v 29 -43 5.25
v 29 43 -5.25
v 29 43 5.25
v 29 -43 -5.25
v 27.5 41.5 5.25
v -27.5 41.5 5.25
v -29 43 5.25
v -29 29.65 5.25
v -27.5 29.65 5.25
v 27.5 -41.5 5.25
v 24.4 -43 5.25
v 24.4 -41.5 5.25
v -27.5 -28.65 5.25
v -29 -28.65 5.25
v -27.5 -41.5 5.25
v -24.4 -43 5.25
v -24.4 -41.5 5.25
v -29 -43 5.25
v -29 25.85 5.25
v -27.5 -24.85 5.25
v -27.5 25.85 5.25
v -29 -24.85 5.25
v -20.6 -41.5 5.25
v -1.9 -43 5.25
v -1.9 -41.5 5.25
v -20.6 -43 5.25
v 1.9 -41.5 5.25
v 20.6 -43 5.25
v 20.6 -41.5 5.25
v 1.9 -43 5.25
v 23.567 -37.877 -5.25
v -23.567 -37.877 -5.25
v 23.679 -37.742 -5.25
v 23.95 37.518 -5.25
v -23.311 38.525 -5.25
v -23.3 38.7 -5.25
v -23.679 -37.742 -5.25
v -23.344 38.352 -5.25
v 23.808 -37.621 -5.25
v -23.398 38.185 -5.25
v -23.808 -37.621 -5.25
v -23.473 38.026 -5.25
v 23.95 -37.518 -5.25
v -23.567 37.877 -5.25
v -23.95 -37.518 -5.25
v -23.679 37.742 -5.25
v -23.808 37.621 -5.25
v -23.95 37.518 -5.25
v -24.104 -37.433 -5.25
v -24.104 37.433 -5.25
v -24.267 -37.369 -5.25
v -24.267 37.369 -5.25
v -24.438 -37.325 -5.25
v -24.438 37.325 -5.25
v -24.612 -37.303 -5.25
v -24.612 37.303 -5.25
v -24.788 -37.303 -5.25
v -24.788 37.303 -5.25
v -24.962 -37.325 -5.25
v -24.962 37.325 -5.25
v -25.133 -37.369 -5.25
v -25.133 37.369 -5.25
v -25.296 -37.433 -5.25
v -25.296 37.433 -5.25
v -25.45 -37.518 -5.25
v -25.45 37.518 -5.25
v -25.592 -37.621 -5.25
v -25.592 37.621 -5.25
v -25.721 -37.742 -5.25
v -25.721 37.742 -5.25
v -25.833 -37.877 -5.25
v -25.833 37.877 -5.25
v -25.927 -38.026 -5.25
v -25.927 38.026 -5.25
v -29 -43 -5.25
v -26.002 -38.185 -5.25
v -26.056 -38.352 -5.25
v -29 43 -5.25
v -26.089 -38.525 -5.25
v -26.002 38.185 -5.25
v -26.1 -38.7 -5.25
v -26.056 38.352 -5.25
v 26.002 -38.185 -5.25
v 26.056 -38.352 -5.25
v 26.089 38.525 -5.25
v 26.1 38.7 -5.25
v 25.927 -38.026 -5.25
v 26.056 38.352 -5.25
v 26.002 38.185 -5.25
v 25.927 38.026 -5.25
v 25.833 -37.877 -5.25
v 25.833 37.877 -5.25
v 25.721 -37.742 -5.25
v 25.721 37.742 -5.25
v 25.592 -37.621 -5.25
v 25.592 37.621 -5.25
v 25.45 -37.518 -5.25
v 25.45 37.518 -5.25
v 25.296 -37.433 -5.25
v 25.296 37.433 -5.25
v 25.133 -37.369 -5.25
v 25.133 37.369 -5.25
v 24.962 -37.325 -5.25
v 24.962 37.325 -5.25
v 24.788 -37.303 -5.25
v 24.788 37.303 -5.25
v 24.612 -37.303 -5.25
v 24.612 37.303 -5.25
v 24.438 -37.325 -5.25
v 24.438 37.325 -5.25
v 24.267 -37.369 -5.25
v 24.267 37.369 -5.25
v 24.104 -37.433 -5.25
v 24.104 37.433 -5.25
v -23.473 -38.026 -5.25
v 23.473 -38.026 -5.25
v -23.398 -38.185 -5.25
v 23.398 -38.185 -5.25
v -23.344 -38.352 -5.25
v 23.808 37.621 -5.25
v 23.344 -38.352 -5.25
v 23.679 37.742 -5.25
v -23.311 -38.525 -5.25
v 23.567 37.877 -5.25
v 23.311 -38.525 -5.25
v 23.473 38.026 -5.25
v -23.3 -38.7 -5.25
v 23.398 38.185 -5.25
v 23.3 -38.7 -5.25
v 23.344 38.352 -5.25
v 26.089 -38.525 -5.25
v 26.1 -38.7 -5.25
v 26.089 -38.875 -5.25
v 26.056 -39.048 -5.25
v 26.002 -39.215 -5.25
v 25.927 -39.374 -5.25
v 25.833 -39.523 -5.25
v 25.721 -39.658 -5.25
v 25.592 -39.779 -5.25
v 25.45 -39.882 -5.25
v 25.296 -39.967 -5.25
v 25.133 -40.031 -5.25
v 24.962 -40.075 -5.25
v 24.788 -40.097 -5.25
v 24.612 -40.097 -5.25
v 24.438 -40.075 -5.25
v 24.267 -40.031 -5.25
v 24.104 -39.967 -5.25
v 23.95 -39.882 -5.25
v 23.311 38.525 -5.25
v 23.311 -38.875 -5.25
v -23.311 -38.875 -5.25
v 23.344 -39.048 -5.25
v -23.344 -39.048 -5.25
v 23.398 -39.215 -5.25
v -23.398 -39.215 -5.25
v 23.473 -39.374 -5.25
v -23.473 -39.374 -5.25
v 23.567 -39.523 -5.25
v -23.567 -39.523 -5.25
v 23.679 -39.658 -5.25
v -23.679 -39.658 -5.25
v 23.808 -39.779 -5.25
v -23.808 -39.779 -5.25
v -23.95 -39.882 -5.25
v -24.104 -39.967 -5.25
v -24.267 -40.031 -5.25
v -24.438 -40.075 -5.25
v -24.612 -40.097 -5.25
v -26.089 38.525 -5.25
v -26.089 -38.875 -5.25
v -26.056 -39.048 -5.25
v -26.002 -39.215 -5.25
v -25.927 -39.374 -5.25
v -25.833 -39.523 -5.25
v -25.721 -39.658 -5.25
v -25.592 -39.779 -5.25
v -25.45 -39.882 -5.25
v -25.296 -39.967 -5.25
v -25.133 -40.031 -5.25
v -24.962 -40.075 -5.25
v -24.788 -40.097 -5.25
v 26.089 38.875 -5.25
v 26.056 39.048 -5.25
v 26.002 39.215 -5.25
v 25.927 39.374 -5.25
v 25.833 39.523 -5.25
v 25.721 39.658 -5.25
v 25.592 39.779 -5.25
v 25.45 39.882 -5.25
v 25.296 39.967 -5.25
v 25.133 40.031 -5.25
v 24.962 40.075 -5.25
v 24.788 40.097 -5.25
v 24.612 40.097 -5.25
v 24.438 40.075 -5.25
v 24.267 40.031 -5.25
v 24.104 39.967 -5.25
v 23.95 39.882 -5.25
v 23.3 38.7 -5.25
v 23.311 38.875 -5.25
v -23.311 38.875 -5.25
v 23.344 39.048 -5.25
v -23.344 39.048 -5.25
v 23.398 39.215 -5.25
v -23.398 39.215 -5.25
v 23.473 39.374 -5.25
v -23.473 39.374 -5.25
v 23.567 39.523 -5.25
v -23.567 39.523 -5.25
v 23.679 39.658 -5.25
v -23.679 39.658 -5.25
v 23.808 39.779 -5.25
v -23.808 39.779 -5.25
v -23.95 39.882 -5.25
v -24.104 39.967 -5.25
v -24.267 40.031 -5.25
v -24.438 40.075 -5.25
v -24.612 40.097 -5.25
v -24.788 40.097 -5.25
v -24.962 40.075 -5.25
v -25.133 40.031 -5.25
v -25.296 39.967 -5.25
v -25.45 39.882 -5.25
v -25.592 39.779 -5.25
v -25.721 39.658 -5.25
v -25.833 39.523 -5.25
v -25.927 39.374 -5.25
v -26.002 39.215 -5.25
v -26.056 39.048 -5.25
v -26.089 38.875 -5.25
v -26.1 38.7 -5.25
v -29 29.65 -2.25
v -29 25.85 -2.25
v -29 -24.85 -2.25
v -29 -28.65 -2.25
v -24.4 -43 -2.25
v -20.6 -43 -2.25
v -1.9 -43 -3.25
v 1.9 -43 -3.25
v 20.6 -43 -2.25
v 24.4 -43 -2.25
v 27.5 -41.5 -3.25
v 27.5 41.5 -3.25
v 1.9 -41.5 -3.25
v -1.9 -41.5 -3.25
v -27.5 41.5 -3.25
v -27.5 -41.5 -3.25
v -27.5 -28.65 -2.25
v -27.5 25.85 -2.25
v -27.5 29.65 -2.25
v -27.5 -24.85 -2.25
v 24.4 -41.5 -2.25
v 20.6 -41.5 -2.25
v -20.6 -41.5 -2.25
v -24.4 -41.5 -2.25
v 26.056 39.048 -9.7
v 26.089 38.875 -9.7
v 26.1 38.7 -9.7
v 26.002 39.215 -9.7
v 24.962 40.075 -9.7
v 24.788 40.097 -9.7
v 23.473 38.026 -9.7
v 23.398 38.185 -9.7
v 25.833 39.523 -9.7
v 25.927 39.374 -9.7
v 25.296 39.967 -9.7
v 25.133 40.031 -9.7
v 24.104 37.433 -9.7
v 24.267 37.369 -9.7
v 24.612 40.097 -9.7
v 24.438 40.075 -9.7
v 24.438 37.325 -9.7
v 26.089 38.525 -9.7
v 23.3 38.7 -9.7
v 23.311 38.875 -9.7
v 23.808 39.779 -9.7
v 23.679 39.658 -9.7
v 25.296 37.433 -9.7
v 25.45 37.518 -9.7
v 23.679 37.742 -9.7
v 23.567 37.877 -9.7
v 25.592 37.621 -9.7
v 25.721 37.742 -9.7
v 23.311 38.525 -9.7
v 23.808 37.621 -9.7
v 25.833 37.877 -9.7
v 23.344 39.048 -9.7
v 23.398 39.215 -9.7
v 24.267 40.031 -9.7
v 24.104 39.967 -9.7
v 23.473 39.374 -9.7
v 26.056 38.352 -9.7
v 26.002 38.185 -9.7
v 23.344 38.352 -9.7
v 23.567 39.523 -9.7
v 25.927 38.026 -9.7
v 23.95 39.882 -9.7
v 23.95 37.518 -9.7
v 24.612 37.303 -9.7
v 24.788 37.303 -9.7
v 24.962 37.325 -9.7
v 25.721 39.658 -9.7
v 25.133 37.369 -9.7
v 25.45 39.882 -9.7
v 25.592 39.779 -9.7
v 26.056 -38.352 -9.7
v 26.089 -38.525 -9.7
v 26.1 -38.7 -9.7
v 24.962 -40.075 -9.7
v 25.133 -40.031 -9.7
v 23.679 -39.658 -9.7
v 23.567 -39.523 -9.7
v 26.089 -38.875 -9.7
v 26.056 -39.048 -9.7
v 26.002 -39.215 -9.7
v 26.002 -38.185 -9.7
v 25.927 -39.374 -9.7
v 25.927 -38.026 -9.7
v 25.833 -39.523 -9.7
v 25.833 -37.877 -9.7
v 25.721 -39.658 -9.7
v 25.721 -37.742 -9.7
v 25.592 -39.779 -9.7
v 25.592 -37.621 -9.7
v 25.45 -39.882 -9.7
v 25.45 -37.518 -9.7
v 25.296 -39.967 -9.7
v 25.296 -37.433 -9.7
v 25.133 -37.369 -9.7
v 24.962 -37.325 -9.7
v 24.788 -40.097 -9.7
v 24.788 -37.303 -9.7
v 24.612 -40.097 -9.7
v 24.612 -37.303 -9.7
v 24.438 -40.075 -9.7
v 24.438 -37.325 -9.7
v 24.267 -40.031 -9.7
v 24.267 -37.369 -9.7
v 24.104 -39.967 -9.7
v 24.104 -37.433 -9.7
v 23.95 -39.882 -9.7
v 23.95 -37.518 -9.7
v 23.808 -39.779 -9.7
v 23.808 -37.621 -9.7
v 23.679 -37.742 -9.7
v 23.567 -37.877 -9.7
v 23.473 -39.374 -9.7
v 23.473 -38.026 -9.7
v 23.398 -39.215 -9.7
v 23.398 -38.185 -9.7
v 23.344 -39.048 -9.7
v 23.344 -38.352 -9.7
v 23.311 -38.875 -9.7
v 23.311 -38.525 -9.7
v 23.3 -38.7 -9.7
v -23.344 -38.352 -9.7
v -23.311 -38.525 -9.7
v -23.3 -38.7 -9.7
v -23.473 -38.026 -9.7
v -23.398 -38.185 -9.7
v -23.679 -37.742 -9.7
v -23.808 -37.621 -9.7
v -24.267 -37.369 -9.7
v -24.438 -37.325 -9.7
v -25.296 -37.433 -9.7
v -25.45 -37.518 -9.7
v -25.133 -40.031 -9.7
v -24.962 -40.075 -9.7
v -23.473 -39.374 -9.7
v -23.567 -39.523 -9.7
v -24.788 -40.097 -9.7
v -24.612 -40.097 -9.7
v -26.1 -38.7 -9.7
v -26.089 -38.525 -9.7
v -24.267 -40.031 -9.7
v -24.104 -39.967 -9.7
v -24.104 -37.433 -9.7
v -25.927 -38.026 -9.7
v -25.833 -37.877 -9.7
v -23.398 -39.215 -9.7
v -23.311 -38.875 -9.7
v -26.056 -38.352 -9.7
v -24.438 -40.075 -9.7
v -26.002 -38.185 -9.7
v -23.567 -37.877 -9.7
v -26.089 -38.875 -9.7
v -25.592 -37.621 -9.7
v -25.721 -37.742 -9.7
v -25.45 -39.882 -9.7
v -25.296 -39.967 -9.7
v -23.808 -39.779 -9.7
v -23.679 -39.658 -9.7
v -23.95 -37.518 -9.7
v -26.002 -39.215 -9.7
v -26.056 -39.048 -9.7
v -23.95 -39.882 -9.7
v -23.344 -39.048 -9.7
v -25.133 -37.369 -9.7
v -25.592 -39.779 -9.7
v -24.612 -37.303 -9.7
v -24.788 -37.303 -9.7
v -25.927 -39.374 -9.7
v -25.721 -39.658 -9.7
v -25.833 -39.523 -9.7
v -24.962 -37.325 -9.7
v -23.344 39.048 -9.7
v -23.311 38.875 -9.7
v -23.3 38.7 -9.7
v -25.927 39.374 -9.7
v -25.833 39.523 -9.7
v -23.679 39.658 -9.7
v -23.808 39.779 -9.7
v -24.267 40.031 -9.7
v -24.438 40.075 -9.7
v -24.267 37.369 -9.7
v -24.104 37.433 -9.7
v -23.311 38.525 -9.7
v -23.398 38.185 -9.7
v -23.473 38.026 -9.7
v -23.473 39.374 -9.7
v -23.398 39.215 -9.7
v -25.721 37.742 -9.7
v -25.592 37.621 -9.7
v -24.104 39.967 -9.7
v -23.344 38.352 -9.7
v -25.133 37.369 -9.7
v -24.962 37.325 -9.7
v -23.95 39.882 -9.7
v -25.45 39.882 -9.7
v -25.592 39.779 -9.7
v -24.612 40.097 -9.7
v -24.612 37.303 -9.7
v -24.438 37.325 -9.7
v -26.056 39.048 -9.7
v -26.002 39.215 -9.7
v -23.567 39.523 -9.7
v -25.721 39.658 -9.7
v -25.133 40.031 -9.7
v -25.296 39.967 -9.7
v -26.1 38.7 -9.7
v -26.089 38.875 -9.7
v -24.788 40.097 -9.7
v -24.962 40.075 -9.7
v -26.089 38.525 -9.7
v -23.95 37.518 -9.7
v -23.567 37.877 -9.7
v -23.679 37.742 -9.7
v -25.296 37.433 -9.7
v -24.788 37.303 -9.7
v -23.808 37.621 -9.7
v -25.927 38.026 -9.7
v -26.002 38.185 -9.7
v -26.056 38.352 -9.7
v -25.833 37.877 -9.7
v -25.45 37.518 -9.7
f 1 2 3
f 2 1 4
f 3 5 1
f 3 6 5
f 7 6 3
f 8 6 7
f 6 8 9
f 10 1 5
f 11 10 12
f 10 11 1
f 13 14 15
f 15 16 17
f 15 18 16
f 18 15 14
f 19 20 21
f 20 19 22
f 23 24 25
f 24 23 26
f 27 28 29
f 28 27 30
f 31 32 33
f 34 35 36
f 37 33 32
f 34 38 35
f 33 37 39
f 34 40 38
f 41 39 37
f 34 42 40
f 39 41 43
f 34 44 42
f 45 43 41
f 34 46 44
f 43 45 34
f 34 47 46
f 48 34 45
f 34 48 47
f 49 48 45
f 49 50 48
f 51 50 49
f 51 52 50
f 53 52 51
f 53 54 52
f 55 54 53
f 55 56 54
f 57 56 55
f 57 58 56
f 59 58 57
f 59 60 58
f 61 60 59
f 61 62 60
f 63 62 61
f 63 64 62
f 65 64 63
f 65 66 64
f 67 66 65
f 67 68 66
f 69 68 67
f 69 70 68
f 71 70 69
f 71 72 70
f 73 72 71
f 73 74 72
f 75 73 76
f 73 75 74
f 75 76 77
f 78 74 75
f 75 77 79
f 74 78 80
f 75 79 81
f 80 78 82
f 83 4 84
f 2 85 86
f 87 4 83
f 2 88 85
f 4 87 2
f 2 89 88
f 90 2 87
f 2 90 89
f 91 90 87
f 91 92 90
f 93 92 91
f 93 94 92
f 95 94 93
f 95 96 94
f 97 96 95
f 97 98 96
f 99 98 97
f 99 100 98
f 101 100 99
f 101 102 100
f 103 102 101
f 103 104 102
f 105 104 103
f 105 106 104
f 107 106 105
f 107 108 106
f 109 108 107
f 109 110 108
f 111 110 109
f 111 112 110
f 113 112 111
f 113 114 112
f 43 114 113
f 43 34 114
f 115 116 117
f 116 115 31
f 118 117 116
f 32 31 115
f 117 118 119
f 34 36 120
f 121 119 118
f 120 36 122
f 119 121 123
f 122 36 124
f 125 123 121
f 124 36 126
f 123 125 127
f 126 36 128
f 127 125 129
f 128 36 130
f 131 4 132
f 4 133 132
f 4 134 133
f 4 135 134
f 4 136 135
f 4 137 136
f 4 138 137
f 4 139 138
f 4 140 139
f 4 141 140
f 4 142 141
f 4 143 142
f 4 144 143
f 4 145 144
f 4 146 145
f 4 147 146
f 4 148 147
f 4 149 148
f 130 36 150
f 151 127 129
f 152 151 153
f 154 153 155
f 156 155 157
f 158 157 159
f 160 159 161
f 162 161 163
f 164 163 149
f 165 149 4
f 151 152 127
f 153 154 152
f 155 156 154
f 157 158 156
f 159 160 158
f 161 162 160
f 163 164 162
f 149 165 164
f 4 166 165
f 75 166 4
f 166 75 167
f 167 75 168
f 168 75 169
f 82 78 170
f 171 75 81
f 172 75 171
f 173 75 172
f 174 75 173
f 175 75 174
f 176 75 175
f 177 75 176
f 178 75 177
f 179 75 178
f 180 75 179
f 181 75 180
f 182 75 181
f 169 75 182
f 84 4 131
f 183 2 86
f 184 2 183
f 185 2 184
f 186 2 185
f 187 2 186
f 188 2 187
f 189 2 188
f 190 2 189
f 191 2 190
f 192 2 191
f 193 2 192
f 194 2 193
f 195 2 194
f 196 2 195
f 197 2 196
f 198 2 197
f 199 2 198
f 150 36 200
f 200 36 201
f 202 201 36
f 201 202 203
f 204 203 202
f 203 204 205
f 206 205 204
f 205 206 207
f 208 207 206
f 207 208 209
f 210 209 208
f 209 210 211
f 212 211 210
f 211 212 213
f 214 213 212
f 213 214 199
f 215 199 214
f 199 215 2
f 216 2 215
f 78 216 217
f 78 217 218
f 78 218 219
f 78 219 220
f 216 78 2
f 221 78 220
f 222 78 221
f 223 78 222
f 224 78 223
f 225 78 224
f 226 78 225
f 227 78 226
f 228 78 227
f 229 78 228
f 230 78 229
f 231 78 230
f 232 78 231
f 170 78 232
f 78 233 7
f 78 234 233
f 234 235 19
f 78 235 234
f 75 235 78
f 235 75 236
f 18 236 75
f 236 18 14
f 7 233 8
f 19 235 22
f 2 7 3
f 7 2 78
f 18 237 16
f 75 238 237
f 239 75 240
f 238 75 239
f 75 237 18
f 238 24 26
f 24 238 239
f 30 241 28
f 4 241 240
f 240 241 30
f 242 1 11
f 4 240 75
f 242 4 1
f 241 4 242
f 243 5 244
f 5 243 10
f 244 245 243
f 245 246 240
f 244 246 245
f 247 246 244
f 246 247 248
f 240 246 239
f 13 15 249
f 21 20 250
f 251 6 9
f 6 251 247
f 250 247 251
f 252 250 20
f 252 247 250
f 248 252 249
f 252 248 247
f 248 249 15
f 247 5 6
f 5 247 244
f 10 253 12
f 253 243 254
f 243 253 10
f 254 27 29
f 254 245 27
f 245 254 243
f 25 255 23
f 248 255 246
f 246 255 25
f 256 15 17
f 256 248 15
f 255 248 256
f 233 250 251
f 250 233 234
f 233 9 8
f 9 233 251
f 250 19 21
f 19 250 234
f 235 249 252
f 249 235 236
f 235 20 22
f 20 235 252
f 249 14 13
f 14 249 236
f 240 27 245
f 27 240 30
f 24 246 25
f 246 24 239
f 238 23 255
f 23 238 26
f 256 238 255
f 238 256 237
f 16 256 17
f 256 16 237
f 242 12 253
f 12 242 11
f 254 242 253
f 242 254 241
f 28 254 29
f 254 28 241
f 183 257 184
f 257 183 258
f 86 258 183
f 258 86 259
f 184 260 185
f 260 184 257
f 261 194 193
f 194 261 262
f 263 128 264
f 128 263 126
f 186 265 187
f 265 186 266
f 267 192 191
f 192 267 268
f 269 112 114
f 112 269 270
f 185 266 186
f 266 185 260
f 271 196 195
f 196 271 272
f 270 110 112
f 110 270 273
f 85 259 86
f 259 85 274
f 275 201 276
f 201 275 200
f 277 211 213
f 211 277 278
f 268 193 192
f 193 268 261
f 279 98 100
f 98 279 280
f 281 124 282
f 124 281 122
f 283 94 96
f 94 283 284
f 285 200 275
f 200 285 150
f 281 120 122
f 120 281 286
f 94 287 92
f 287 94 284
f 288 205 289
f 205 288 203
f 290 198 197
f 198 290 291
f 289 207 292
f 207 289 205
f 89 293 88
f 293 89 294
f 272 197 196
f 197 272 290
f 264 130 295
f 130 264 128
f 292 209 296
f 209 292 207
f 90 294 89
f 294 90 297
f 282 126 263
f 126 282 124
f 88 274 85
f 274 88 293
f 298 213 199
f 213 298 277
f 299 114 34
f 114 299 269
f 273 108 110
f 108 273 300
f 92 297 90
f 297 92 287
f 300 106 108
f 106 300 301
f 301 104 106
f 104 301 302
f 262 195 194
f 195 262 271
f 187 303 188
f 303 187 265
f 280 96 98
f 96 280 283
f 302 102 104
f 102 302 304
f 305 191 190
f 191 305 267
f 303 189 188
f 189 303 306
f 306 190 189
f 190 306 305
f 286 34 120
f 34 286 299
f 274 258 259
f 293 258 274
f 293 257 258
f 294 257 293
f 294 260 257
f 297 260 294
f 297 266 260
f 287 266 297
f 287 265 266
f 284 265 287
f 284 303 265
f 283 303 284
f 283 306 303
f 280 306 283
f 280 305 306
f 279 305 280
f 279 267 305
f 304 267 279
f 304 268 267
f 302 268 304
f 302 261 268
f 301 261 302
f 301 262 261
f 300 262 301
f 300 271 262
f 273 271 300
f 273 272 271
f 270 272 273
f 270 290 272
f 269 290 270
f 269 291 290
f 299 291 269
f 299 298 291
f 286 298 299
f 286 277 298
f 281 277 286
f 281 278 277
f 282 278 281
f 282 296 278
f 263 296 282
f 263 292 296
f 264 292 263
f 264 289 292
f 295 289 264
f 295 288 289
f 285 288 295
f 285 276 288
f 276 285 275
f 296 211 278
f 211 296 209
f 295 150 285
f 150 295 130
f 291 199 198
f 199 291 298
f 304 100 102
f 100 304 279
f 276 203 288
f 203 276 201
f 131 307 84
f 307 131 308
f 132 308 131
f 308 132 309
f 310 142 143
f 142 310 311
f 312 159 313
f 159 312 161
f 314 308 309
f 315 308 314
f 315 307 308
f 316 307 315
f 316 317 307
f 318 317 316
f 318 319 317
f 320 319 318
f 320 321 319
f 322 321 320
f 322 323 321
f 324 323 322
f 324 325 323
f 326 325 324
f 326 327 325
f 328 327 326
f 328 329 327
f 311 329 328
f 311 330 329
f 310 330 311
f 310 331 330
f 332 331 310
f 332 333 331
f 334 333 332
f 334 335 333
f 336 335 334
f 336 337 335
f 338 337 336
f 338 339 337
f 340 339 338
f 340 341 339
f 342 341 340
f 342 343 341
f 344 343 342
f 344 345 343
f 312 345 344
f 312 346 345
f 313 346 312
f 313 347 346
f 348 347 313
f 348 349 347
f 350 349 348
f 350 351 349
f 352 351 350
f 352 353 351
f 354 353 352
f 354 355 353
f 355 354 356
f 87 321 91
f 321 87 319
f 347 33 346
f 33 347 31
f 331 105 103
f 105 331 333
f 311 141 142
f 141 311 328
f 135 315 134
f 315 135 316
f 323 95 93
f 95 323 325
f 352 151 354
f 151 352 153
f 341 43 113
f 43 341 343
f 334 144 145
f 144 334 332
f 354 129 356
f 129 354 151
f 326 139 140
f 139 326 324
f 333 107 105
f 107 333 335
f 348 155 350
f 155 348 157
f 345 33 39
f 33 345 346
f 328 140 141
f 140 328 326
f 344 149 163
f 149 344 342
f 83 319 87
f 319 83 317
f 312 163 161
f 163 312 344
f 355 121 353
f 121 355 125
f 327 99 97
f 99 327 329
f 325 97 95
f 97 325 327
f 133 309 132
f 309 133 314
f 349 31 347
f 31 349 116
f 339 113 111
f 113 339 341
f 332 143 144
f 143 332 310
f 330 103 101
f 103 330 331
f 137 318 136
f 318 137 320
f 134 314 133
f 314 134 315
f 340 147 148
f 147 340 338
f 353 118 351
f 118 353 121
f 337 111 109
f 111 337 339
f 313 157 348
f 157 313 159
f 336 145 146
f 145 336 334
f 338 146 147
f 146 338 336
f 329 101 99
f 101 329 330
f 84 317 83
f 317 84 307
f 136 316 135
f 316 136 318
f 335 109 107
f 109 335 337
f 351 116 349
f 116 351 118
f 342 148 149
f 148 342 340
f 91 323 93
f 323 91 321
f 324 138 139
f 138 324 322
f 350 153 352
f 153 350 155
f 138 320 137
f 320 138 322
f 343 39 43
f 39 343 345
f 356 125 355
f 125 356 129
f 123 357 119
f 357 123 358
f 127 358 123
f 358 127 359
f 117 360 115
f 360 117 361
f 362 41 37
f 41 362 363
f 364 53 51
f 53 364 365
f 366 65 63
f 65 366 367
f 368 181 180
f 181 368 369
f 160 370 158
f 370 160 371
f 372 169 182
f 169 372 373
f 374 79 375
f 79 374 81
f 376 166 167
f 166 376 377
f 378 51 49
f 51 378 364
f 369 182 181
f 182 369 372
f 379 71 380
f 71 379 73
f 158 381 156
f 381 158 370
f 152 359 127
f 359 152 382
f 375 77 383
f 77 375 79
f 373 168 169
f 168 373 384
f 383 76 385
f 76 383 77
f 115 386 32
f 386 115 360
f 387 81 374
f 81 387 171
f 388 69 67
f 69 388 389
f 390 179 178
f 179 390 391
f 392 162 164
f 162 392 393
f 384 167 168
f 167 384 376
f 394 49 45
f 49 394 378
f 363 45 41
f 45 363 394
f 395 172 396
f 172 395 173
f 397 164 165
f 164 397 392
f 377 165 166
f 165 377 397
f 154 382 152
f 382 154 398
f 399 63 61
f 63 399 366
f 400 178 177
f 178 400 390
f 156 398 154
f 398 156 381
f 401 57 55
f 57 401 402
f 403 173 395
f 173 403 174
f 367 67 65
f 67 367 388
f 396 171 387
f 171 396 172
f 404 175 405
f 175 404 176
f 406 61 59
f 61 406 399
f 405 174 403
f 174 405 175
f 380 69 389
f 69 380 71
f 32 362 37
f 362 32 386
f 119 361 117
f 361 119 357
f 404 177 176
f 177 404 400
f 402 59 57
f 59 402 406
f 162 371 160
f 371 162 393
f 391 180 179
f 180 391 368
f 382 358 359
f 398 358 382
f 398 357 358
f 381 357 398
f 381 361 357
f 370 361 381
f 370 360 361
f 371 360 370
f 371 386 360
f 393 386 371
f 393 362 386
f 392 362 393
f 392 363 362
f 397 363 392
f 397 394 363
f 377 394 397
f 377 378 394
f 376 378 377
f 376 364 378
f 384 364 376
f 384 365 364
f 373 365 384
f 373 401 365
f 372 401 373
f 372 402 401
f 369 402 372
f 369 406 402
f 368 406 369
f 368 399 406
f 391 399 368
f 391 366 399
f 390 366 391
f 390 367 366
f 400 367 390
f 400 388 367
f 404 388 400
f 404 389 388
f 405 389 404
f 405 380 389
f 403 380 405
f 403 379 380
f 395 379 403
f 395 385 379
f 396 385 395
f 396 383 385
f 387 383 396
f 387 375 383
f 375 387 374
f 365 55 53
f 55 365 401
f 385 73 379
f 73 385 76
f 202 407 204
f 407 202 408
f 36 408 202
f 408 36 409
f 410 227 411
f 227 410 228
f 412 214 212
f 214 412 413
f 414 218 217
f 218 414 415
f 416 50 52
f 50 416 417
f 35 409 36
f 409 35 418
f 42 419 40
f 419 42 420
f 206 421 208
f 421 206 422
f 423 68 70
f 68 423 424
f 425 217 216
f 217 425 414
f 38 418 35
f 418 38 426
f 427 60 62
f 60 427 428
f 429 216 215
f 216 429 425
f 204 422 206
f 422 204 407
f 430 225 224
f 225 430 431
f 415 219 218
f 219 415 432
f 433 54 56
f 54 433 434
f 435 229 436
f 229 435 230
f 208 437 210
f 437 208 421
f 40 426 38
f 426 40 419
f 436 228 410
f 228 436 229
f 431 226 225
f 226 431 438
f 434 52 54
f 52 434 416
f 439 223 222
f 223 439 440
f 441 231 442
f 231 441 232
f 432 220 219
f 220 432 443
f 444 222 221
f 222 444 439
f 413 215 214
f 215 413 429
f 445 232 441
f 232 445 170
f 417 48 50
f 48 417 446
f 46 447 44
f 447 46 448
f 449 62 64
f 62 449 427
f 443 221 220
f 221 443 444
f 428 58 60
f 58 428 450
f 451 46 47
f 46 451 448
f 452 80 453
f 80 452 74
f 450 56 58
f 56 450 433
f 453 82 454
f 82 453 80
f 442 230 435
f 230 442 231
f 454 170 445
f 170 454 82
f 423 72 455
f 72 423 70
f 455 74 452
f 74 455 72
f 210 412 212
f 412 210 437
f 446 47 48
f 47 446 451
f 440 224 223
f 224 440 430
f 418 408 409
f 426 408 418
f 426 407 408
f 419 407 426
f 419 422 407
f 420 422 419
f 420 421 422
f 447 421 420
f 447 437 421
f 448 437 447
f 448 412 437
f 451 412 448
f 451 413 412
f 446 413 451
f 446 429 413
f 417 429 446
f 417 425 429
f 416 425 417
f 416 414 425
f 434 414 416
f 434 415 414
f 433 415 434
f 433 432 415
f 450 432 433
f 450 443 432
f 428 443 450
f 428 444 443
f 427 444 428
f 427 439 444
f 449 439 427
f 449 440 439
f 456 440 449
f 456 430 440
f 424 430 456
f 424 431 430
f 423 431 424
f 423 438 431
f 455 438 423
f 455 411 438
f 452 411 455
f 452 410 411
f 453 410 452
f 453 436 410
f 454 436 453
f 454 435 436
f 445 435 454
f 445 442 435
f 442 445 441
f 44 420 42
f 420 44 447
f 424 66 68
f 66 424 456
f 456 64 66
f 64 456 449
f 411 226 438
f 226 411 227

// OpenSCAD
// file: breadboard_pegs.scad
   include <../robot_settings.scad>
   $fn = 50;
   
    module breadboard_pegs(show_platform = true)
    {
       // pegs for battery_box
       translate([0, 0, -.55])
       {
       translate([breadboard_width / 2 -power_bar_screw_d, breadboard_length / 2 - power_bar_screw_d, 0])
         {
            difference() {
               cylinder(h = raspberry_pi_peg_h, d = 2 * power_bar_screw_d,  center = true);
               translate([0, 0, raspberry_pi_peg_h - raspberry_pi_peg_h + 1])
                 cylinder(h = raspberry_pi_peg_h + 1, d =  power_bar_screw_d + .22,  center = true);
            }
         }

     translate([-breadboard_width / 2 + power_bar_screw_d, -breadboard_length / 2 + power_bar_screw_d, 0])
         {
            difference() {
               cylinder(h = raspberry_pi_peg_h, d = 2 * power_bar_screw_d,  center = true);
               translate([0, 0, raspberry_pi_peg_h - raspberry_pi_peg_h + 1])
                 cylinder(h = raspberry_pi_peg_h + 1, d =  power_bar_screw_d  + .22,  center = true);
            }
         }

     translate([-breadboard_width / 2 + power_bar_screw_d, breadboard_length / 2 - power_bar_screw_d, 0])
         {
            difference() {
               cylinder(h = raspberry_pi_peg_h, d = 2 * power_bar_screw_d,  center = true);
               translate([0, 0, raspberry_pi_peg_h - raspberry_pi_peg_h + 1])
                 cylinder(h = raspberry_pi_peg_h + 1, d =  power_bar_screw_d + .22,  center = true);
            }
         }

     translate([breadboard_width / 2 - power_bar_screw_d, -breadboard_length / 2 + power_bar_screw_d, 0])
     {
         difference() {
             cylinder(h = raspberry_pi_peg_h, d = 2 * power_bar_screw_d,  center = true);
             translate([0, 0, raspberry_pi_peg_h - raspberry_pi_peg_h + 1])
               cylinder(h = raspberry_pi_peg_h + 1, d =  power_bar_screw_d + .22,  center = true);
             //translate([1, -power_bar_screw_d / 2, -2.8])
             //cube([power_bar_screw_d, power_bar_screw_d, 10]);
          }

        }     
    }
    
    if (show_platform)
    {
      translate([0, 0, -raspberry_pi_peg_h])
      cube([breadboard_width, breadboard_length, 4], center = true);
    }
}
breadboard_pegs();
// file: breadboard_mount.scad
   include <../robot_settings.scad>
   
   module breadboard_mount() {
      difference() { 
      // main box
     cube([breadboard_width + breadboard_wall_thickness, breadboard_length + breadboard_wall_thickness, breadboard_height], center = true);
     
     // main box cutout 
     translate([0, 0, wall_thickness])
     cube([breadboard_width, breadboard_length, breadboard_height], center = true);
   
      // left longside notch
      translate([-breadboard_width / 2, breadboard_longside_notch_separation / 2 - 0.4, breadboard_wall_thickness])
      cube([2 *breadboard_wall_thickness, breadboard_notch_width, breadboard_height], center = true);
     
        // right longside notch
        translate([-breadboard_width / 2, -breadboard_longside_notch_separation / 2 + 1.4, breadboard_wall_thickness])
        cube([2 *breadboard_wall_thickness, breadboard_notch_width, breadboard_height], center = true);
     
      // center shortside notch
      translate([0, -breadboard_length / 2, wall_thickness])
      cube([breadboard_notch_width, 2 *breadboard_wall_thickness, breadboard_height], center = true);
     
       // right shortside notch
       translate([-breadboard_shortside_notch_separation, -breadboard_length / 2, breadboard_wall_thickness])
       cube([breadboard_notch_width, 2 *breadboard_wall_thickness, breadboard_height], center = true);
     
      // left shortside notch
      translate([breadboard_shortside_notch_separation, -breadboard_length / 2, breadboard_wall_thickness])
      cube([breadboard_notch_width, 2 *breadboard_wall_thickness, breadboard_height], center = true);
  }
}
breadboard_mount();
// file: ../robot_settings.scad
main_box_x = 95; // 96
main_box_y = 102;
main_box_z = 74; // 74.5
wall_thickness = 2;

rail_gap = 2;
rail_inset = 7;

rail_thickness = 7;
rail_length = 250;
rail_width = 200;

raspberry_pi_screw_seperation_y = 57;
raspberry_pi_screw_seperation_z = 48;
raspberry_pi_peg_h = 5;

gears_module = 1;
pinion_gear_teeth = 30;
pinion_gear_width = 5;
pinion_gear_bore = 4;

gears_setback_distance = 25;
gear_post_height = 2 * pinion_gear_width + rail_thickness + 8 ;

steering_motor_mount_x = 45;
steering_motor_mount_y = 36;
steering_motor_mount_z = 18;
steering_motor_mount_setback_distance = gears_setback_distance + 16;

dc_motor_drivertype = "Teyleten"; // Teyleten
isAdafruit = (dc_motor_drivertype == "Adafruit");

drv8871_x = isAdafruit ? 20.3 : 21.6;
drv8871_y = isAdafruit ?  24 : 25;

drv8871_z = 2;
drv8871_screw_d = 2.5;
drv8871_solder_points_z = 2;

drv8871mount_edge_x = 1.5;
drv8871mount_edge_wall = 3;
drv8871mount_z = 5;
drv8871mount_x = drv8871_x +  drv8871mount_edge_wall - 2* drv8871mount_edge_x;
drv8871mount_y = 19;

drv8871_screw_distance = 15.64;
drv8871_solder_points_d = 1.66;
drv8871_solder_offset_y = 4.4;
drv8871_solder_inner_points_distance = 5;
drv8871_solder_outer_points_distance = 12;

dc_motor_housing_minus_encoder_z = 48;
dc_motor_encoder_z = 9.33;
dc_motor_encoder_wheel_d = 13.4;
dc_motor_encoder_wheel_thickness = 5;
dc_motor_encoder_wheel_gap = 3;
dc_motor_encoder_circuit_thickness = 2;
dc_motor_cutout_d = 24.8;
dc_motor_cutout_z = 19.5;

dc_motor_screw_head_z = 2;
dc_motor_screw_head_d = 5.6;
dc_motor_screw_d = 3.2;
dc_motor_screw_offset = 8.5;

dc_motor_axle_ring_z = 3;
dc_motor_axle_ring_d = 7.2;
dc_motor_axle_cutout_d = 4.5;
dc_motor_axle_cutout_z = 10;
dc_motor_axle_notch_cutout = 0.4;
dc_motor_axle_notch_cutout_z = 6;

pdmount_x = 20;
pdmount_y = 30;
pdmount_z = 2;
pdmount_edge_x = 1.5;
pdmount_edge_wall = 3;

steering_shaft_z = 45;
steering_shaft_d = 7;
steering_shaft_motor_fitting_d = 9;
coupler_length = 24.6;
coupler_diameter = 14;
coupler_screw_d = 4;
coupler_screw_z_offset = 5;
coupler_gear_side_insert = 12.6;
steering_shaft_with_coupler_z = steering_shaft_z - coupler_gear_side_insert;

lidar_mount_y = 110;
lidar_mount_x = 65 + 20;
lidar_narrow_screws = 40;
lidar_wide_screws = 56;
lidar_front_to_back_screws = 70;
lidar_screw_d = 3;
lidar_circuitboard_x = 20;
lidar_circuitboard_y = 35;
lidar_circuitboard_z = 1.2;
lidar_cord_length = 29;

ball_bearing_height = 7;
ball_bearing_outer_diameter = 22;
ball_bearing_inner_diameter = 8;

 armature_holder_height = 20;
 armature_holder_thickness = 8;
pull_bar_peg_r = 3.2;
apparatus_locking_peg_d = 4;

rack_module = 1;
rack_length = main_box_x / 2;
rack_height = 10;
rack_width = 10;
rack_teeth = 30;
rack_bore = 3;

pull_bar_length = rail_width / 2 - rack_length + 1;

// tire hardware
axle_length = 30;
axle_reciever_inner_diameter = 7.75;
axle_reciever_length = 18.8;
axle_notch_length = 7;
axle_notch_cutout = 2.4;

// power distribution bar
power_bar_cutout_x = 96;
power_bar_y = 19.1;
power_bar_z = 1.5;
power_bar_screw_distance = 91.4;
power_bar_screw_d = 2.8;
power_bar_standoff_z = 5;
power_bar_standoff_d = 6.83;

// breadboard
breadboard_wall_thickness = 3;
breadboard_width = 55;
breadboard_length = 83;
breadboard_height = 10.5;
breadboard_notch_width = 3.8;
breadboard_longside_notch_separation = 58.2 - breadboard_notch_width / 2;
breadboard_shortside_notch_separation = 26.3 - breadboard_notch_width;

pico_expander_width = 63;
pico_expander_height = 57;
pico_screw_hole_offset = 3;
pico_screw_hole_d = 2.5;

usbhub_thickness = 11.7;
usbhub_depth = 37.5;
usbhub_width = 86.7;
usbhub_end_port_width = 14.8;
usbhub_front_face_safe_zone_left = 10;
usbhub_front_face_safe_zone_right = 14.8;

switch_w = 16;
switch_cutout_d = 12.2;
switch_bump_h = 2;
switch_bump_l = 18.2;
// main file
   include <../robot_settings.scad>
   
   use <breadboard_mount.scad>
   use <breadboard_pegs.scad>
   $fn = 50;
   
   breadboard_mount();
   translate([0, 0, -raspberry_pi_peg_h - 2.2])
   {
     translate([breadboard_width / 2 -power_bar_screw_d, breadboard_length / 2 - power_bar_screw_d, 0])
     cylinder(h = raspberry_pi_peg_h, d = power_bar_screw_d, center = true);
     
     translate([breadboard_width / 2 -power_bar_screw_d, -breadboard_length / 2 + power_bar_screw_d, 0])
      cylinder(h = raspberry_pi_peg_h, d =  power_bar_screw_d,  center = true);
     
     translate([-breadboard_width / 2 +power_bar_screw_d, -breadboard_length / 2 + power_bar_screw_d, 0])
      cylinder(h = raspberry_pi_peg_h, d =  power_bar_screw_d,  center = true);
     
     translate([-breadboard_width / 2  + power_bar_screw_d, breadboard_length / 2 - power_bar_screw_d, 0])
      cylinder(h = raspberry_pi_peg_h, d =  power_bar_screw_d,  center = true);

    //translate([0,0, -.6]) 
   //breadboard_pegs();
   }
